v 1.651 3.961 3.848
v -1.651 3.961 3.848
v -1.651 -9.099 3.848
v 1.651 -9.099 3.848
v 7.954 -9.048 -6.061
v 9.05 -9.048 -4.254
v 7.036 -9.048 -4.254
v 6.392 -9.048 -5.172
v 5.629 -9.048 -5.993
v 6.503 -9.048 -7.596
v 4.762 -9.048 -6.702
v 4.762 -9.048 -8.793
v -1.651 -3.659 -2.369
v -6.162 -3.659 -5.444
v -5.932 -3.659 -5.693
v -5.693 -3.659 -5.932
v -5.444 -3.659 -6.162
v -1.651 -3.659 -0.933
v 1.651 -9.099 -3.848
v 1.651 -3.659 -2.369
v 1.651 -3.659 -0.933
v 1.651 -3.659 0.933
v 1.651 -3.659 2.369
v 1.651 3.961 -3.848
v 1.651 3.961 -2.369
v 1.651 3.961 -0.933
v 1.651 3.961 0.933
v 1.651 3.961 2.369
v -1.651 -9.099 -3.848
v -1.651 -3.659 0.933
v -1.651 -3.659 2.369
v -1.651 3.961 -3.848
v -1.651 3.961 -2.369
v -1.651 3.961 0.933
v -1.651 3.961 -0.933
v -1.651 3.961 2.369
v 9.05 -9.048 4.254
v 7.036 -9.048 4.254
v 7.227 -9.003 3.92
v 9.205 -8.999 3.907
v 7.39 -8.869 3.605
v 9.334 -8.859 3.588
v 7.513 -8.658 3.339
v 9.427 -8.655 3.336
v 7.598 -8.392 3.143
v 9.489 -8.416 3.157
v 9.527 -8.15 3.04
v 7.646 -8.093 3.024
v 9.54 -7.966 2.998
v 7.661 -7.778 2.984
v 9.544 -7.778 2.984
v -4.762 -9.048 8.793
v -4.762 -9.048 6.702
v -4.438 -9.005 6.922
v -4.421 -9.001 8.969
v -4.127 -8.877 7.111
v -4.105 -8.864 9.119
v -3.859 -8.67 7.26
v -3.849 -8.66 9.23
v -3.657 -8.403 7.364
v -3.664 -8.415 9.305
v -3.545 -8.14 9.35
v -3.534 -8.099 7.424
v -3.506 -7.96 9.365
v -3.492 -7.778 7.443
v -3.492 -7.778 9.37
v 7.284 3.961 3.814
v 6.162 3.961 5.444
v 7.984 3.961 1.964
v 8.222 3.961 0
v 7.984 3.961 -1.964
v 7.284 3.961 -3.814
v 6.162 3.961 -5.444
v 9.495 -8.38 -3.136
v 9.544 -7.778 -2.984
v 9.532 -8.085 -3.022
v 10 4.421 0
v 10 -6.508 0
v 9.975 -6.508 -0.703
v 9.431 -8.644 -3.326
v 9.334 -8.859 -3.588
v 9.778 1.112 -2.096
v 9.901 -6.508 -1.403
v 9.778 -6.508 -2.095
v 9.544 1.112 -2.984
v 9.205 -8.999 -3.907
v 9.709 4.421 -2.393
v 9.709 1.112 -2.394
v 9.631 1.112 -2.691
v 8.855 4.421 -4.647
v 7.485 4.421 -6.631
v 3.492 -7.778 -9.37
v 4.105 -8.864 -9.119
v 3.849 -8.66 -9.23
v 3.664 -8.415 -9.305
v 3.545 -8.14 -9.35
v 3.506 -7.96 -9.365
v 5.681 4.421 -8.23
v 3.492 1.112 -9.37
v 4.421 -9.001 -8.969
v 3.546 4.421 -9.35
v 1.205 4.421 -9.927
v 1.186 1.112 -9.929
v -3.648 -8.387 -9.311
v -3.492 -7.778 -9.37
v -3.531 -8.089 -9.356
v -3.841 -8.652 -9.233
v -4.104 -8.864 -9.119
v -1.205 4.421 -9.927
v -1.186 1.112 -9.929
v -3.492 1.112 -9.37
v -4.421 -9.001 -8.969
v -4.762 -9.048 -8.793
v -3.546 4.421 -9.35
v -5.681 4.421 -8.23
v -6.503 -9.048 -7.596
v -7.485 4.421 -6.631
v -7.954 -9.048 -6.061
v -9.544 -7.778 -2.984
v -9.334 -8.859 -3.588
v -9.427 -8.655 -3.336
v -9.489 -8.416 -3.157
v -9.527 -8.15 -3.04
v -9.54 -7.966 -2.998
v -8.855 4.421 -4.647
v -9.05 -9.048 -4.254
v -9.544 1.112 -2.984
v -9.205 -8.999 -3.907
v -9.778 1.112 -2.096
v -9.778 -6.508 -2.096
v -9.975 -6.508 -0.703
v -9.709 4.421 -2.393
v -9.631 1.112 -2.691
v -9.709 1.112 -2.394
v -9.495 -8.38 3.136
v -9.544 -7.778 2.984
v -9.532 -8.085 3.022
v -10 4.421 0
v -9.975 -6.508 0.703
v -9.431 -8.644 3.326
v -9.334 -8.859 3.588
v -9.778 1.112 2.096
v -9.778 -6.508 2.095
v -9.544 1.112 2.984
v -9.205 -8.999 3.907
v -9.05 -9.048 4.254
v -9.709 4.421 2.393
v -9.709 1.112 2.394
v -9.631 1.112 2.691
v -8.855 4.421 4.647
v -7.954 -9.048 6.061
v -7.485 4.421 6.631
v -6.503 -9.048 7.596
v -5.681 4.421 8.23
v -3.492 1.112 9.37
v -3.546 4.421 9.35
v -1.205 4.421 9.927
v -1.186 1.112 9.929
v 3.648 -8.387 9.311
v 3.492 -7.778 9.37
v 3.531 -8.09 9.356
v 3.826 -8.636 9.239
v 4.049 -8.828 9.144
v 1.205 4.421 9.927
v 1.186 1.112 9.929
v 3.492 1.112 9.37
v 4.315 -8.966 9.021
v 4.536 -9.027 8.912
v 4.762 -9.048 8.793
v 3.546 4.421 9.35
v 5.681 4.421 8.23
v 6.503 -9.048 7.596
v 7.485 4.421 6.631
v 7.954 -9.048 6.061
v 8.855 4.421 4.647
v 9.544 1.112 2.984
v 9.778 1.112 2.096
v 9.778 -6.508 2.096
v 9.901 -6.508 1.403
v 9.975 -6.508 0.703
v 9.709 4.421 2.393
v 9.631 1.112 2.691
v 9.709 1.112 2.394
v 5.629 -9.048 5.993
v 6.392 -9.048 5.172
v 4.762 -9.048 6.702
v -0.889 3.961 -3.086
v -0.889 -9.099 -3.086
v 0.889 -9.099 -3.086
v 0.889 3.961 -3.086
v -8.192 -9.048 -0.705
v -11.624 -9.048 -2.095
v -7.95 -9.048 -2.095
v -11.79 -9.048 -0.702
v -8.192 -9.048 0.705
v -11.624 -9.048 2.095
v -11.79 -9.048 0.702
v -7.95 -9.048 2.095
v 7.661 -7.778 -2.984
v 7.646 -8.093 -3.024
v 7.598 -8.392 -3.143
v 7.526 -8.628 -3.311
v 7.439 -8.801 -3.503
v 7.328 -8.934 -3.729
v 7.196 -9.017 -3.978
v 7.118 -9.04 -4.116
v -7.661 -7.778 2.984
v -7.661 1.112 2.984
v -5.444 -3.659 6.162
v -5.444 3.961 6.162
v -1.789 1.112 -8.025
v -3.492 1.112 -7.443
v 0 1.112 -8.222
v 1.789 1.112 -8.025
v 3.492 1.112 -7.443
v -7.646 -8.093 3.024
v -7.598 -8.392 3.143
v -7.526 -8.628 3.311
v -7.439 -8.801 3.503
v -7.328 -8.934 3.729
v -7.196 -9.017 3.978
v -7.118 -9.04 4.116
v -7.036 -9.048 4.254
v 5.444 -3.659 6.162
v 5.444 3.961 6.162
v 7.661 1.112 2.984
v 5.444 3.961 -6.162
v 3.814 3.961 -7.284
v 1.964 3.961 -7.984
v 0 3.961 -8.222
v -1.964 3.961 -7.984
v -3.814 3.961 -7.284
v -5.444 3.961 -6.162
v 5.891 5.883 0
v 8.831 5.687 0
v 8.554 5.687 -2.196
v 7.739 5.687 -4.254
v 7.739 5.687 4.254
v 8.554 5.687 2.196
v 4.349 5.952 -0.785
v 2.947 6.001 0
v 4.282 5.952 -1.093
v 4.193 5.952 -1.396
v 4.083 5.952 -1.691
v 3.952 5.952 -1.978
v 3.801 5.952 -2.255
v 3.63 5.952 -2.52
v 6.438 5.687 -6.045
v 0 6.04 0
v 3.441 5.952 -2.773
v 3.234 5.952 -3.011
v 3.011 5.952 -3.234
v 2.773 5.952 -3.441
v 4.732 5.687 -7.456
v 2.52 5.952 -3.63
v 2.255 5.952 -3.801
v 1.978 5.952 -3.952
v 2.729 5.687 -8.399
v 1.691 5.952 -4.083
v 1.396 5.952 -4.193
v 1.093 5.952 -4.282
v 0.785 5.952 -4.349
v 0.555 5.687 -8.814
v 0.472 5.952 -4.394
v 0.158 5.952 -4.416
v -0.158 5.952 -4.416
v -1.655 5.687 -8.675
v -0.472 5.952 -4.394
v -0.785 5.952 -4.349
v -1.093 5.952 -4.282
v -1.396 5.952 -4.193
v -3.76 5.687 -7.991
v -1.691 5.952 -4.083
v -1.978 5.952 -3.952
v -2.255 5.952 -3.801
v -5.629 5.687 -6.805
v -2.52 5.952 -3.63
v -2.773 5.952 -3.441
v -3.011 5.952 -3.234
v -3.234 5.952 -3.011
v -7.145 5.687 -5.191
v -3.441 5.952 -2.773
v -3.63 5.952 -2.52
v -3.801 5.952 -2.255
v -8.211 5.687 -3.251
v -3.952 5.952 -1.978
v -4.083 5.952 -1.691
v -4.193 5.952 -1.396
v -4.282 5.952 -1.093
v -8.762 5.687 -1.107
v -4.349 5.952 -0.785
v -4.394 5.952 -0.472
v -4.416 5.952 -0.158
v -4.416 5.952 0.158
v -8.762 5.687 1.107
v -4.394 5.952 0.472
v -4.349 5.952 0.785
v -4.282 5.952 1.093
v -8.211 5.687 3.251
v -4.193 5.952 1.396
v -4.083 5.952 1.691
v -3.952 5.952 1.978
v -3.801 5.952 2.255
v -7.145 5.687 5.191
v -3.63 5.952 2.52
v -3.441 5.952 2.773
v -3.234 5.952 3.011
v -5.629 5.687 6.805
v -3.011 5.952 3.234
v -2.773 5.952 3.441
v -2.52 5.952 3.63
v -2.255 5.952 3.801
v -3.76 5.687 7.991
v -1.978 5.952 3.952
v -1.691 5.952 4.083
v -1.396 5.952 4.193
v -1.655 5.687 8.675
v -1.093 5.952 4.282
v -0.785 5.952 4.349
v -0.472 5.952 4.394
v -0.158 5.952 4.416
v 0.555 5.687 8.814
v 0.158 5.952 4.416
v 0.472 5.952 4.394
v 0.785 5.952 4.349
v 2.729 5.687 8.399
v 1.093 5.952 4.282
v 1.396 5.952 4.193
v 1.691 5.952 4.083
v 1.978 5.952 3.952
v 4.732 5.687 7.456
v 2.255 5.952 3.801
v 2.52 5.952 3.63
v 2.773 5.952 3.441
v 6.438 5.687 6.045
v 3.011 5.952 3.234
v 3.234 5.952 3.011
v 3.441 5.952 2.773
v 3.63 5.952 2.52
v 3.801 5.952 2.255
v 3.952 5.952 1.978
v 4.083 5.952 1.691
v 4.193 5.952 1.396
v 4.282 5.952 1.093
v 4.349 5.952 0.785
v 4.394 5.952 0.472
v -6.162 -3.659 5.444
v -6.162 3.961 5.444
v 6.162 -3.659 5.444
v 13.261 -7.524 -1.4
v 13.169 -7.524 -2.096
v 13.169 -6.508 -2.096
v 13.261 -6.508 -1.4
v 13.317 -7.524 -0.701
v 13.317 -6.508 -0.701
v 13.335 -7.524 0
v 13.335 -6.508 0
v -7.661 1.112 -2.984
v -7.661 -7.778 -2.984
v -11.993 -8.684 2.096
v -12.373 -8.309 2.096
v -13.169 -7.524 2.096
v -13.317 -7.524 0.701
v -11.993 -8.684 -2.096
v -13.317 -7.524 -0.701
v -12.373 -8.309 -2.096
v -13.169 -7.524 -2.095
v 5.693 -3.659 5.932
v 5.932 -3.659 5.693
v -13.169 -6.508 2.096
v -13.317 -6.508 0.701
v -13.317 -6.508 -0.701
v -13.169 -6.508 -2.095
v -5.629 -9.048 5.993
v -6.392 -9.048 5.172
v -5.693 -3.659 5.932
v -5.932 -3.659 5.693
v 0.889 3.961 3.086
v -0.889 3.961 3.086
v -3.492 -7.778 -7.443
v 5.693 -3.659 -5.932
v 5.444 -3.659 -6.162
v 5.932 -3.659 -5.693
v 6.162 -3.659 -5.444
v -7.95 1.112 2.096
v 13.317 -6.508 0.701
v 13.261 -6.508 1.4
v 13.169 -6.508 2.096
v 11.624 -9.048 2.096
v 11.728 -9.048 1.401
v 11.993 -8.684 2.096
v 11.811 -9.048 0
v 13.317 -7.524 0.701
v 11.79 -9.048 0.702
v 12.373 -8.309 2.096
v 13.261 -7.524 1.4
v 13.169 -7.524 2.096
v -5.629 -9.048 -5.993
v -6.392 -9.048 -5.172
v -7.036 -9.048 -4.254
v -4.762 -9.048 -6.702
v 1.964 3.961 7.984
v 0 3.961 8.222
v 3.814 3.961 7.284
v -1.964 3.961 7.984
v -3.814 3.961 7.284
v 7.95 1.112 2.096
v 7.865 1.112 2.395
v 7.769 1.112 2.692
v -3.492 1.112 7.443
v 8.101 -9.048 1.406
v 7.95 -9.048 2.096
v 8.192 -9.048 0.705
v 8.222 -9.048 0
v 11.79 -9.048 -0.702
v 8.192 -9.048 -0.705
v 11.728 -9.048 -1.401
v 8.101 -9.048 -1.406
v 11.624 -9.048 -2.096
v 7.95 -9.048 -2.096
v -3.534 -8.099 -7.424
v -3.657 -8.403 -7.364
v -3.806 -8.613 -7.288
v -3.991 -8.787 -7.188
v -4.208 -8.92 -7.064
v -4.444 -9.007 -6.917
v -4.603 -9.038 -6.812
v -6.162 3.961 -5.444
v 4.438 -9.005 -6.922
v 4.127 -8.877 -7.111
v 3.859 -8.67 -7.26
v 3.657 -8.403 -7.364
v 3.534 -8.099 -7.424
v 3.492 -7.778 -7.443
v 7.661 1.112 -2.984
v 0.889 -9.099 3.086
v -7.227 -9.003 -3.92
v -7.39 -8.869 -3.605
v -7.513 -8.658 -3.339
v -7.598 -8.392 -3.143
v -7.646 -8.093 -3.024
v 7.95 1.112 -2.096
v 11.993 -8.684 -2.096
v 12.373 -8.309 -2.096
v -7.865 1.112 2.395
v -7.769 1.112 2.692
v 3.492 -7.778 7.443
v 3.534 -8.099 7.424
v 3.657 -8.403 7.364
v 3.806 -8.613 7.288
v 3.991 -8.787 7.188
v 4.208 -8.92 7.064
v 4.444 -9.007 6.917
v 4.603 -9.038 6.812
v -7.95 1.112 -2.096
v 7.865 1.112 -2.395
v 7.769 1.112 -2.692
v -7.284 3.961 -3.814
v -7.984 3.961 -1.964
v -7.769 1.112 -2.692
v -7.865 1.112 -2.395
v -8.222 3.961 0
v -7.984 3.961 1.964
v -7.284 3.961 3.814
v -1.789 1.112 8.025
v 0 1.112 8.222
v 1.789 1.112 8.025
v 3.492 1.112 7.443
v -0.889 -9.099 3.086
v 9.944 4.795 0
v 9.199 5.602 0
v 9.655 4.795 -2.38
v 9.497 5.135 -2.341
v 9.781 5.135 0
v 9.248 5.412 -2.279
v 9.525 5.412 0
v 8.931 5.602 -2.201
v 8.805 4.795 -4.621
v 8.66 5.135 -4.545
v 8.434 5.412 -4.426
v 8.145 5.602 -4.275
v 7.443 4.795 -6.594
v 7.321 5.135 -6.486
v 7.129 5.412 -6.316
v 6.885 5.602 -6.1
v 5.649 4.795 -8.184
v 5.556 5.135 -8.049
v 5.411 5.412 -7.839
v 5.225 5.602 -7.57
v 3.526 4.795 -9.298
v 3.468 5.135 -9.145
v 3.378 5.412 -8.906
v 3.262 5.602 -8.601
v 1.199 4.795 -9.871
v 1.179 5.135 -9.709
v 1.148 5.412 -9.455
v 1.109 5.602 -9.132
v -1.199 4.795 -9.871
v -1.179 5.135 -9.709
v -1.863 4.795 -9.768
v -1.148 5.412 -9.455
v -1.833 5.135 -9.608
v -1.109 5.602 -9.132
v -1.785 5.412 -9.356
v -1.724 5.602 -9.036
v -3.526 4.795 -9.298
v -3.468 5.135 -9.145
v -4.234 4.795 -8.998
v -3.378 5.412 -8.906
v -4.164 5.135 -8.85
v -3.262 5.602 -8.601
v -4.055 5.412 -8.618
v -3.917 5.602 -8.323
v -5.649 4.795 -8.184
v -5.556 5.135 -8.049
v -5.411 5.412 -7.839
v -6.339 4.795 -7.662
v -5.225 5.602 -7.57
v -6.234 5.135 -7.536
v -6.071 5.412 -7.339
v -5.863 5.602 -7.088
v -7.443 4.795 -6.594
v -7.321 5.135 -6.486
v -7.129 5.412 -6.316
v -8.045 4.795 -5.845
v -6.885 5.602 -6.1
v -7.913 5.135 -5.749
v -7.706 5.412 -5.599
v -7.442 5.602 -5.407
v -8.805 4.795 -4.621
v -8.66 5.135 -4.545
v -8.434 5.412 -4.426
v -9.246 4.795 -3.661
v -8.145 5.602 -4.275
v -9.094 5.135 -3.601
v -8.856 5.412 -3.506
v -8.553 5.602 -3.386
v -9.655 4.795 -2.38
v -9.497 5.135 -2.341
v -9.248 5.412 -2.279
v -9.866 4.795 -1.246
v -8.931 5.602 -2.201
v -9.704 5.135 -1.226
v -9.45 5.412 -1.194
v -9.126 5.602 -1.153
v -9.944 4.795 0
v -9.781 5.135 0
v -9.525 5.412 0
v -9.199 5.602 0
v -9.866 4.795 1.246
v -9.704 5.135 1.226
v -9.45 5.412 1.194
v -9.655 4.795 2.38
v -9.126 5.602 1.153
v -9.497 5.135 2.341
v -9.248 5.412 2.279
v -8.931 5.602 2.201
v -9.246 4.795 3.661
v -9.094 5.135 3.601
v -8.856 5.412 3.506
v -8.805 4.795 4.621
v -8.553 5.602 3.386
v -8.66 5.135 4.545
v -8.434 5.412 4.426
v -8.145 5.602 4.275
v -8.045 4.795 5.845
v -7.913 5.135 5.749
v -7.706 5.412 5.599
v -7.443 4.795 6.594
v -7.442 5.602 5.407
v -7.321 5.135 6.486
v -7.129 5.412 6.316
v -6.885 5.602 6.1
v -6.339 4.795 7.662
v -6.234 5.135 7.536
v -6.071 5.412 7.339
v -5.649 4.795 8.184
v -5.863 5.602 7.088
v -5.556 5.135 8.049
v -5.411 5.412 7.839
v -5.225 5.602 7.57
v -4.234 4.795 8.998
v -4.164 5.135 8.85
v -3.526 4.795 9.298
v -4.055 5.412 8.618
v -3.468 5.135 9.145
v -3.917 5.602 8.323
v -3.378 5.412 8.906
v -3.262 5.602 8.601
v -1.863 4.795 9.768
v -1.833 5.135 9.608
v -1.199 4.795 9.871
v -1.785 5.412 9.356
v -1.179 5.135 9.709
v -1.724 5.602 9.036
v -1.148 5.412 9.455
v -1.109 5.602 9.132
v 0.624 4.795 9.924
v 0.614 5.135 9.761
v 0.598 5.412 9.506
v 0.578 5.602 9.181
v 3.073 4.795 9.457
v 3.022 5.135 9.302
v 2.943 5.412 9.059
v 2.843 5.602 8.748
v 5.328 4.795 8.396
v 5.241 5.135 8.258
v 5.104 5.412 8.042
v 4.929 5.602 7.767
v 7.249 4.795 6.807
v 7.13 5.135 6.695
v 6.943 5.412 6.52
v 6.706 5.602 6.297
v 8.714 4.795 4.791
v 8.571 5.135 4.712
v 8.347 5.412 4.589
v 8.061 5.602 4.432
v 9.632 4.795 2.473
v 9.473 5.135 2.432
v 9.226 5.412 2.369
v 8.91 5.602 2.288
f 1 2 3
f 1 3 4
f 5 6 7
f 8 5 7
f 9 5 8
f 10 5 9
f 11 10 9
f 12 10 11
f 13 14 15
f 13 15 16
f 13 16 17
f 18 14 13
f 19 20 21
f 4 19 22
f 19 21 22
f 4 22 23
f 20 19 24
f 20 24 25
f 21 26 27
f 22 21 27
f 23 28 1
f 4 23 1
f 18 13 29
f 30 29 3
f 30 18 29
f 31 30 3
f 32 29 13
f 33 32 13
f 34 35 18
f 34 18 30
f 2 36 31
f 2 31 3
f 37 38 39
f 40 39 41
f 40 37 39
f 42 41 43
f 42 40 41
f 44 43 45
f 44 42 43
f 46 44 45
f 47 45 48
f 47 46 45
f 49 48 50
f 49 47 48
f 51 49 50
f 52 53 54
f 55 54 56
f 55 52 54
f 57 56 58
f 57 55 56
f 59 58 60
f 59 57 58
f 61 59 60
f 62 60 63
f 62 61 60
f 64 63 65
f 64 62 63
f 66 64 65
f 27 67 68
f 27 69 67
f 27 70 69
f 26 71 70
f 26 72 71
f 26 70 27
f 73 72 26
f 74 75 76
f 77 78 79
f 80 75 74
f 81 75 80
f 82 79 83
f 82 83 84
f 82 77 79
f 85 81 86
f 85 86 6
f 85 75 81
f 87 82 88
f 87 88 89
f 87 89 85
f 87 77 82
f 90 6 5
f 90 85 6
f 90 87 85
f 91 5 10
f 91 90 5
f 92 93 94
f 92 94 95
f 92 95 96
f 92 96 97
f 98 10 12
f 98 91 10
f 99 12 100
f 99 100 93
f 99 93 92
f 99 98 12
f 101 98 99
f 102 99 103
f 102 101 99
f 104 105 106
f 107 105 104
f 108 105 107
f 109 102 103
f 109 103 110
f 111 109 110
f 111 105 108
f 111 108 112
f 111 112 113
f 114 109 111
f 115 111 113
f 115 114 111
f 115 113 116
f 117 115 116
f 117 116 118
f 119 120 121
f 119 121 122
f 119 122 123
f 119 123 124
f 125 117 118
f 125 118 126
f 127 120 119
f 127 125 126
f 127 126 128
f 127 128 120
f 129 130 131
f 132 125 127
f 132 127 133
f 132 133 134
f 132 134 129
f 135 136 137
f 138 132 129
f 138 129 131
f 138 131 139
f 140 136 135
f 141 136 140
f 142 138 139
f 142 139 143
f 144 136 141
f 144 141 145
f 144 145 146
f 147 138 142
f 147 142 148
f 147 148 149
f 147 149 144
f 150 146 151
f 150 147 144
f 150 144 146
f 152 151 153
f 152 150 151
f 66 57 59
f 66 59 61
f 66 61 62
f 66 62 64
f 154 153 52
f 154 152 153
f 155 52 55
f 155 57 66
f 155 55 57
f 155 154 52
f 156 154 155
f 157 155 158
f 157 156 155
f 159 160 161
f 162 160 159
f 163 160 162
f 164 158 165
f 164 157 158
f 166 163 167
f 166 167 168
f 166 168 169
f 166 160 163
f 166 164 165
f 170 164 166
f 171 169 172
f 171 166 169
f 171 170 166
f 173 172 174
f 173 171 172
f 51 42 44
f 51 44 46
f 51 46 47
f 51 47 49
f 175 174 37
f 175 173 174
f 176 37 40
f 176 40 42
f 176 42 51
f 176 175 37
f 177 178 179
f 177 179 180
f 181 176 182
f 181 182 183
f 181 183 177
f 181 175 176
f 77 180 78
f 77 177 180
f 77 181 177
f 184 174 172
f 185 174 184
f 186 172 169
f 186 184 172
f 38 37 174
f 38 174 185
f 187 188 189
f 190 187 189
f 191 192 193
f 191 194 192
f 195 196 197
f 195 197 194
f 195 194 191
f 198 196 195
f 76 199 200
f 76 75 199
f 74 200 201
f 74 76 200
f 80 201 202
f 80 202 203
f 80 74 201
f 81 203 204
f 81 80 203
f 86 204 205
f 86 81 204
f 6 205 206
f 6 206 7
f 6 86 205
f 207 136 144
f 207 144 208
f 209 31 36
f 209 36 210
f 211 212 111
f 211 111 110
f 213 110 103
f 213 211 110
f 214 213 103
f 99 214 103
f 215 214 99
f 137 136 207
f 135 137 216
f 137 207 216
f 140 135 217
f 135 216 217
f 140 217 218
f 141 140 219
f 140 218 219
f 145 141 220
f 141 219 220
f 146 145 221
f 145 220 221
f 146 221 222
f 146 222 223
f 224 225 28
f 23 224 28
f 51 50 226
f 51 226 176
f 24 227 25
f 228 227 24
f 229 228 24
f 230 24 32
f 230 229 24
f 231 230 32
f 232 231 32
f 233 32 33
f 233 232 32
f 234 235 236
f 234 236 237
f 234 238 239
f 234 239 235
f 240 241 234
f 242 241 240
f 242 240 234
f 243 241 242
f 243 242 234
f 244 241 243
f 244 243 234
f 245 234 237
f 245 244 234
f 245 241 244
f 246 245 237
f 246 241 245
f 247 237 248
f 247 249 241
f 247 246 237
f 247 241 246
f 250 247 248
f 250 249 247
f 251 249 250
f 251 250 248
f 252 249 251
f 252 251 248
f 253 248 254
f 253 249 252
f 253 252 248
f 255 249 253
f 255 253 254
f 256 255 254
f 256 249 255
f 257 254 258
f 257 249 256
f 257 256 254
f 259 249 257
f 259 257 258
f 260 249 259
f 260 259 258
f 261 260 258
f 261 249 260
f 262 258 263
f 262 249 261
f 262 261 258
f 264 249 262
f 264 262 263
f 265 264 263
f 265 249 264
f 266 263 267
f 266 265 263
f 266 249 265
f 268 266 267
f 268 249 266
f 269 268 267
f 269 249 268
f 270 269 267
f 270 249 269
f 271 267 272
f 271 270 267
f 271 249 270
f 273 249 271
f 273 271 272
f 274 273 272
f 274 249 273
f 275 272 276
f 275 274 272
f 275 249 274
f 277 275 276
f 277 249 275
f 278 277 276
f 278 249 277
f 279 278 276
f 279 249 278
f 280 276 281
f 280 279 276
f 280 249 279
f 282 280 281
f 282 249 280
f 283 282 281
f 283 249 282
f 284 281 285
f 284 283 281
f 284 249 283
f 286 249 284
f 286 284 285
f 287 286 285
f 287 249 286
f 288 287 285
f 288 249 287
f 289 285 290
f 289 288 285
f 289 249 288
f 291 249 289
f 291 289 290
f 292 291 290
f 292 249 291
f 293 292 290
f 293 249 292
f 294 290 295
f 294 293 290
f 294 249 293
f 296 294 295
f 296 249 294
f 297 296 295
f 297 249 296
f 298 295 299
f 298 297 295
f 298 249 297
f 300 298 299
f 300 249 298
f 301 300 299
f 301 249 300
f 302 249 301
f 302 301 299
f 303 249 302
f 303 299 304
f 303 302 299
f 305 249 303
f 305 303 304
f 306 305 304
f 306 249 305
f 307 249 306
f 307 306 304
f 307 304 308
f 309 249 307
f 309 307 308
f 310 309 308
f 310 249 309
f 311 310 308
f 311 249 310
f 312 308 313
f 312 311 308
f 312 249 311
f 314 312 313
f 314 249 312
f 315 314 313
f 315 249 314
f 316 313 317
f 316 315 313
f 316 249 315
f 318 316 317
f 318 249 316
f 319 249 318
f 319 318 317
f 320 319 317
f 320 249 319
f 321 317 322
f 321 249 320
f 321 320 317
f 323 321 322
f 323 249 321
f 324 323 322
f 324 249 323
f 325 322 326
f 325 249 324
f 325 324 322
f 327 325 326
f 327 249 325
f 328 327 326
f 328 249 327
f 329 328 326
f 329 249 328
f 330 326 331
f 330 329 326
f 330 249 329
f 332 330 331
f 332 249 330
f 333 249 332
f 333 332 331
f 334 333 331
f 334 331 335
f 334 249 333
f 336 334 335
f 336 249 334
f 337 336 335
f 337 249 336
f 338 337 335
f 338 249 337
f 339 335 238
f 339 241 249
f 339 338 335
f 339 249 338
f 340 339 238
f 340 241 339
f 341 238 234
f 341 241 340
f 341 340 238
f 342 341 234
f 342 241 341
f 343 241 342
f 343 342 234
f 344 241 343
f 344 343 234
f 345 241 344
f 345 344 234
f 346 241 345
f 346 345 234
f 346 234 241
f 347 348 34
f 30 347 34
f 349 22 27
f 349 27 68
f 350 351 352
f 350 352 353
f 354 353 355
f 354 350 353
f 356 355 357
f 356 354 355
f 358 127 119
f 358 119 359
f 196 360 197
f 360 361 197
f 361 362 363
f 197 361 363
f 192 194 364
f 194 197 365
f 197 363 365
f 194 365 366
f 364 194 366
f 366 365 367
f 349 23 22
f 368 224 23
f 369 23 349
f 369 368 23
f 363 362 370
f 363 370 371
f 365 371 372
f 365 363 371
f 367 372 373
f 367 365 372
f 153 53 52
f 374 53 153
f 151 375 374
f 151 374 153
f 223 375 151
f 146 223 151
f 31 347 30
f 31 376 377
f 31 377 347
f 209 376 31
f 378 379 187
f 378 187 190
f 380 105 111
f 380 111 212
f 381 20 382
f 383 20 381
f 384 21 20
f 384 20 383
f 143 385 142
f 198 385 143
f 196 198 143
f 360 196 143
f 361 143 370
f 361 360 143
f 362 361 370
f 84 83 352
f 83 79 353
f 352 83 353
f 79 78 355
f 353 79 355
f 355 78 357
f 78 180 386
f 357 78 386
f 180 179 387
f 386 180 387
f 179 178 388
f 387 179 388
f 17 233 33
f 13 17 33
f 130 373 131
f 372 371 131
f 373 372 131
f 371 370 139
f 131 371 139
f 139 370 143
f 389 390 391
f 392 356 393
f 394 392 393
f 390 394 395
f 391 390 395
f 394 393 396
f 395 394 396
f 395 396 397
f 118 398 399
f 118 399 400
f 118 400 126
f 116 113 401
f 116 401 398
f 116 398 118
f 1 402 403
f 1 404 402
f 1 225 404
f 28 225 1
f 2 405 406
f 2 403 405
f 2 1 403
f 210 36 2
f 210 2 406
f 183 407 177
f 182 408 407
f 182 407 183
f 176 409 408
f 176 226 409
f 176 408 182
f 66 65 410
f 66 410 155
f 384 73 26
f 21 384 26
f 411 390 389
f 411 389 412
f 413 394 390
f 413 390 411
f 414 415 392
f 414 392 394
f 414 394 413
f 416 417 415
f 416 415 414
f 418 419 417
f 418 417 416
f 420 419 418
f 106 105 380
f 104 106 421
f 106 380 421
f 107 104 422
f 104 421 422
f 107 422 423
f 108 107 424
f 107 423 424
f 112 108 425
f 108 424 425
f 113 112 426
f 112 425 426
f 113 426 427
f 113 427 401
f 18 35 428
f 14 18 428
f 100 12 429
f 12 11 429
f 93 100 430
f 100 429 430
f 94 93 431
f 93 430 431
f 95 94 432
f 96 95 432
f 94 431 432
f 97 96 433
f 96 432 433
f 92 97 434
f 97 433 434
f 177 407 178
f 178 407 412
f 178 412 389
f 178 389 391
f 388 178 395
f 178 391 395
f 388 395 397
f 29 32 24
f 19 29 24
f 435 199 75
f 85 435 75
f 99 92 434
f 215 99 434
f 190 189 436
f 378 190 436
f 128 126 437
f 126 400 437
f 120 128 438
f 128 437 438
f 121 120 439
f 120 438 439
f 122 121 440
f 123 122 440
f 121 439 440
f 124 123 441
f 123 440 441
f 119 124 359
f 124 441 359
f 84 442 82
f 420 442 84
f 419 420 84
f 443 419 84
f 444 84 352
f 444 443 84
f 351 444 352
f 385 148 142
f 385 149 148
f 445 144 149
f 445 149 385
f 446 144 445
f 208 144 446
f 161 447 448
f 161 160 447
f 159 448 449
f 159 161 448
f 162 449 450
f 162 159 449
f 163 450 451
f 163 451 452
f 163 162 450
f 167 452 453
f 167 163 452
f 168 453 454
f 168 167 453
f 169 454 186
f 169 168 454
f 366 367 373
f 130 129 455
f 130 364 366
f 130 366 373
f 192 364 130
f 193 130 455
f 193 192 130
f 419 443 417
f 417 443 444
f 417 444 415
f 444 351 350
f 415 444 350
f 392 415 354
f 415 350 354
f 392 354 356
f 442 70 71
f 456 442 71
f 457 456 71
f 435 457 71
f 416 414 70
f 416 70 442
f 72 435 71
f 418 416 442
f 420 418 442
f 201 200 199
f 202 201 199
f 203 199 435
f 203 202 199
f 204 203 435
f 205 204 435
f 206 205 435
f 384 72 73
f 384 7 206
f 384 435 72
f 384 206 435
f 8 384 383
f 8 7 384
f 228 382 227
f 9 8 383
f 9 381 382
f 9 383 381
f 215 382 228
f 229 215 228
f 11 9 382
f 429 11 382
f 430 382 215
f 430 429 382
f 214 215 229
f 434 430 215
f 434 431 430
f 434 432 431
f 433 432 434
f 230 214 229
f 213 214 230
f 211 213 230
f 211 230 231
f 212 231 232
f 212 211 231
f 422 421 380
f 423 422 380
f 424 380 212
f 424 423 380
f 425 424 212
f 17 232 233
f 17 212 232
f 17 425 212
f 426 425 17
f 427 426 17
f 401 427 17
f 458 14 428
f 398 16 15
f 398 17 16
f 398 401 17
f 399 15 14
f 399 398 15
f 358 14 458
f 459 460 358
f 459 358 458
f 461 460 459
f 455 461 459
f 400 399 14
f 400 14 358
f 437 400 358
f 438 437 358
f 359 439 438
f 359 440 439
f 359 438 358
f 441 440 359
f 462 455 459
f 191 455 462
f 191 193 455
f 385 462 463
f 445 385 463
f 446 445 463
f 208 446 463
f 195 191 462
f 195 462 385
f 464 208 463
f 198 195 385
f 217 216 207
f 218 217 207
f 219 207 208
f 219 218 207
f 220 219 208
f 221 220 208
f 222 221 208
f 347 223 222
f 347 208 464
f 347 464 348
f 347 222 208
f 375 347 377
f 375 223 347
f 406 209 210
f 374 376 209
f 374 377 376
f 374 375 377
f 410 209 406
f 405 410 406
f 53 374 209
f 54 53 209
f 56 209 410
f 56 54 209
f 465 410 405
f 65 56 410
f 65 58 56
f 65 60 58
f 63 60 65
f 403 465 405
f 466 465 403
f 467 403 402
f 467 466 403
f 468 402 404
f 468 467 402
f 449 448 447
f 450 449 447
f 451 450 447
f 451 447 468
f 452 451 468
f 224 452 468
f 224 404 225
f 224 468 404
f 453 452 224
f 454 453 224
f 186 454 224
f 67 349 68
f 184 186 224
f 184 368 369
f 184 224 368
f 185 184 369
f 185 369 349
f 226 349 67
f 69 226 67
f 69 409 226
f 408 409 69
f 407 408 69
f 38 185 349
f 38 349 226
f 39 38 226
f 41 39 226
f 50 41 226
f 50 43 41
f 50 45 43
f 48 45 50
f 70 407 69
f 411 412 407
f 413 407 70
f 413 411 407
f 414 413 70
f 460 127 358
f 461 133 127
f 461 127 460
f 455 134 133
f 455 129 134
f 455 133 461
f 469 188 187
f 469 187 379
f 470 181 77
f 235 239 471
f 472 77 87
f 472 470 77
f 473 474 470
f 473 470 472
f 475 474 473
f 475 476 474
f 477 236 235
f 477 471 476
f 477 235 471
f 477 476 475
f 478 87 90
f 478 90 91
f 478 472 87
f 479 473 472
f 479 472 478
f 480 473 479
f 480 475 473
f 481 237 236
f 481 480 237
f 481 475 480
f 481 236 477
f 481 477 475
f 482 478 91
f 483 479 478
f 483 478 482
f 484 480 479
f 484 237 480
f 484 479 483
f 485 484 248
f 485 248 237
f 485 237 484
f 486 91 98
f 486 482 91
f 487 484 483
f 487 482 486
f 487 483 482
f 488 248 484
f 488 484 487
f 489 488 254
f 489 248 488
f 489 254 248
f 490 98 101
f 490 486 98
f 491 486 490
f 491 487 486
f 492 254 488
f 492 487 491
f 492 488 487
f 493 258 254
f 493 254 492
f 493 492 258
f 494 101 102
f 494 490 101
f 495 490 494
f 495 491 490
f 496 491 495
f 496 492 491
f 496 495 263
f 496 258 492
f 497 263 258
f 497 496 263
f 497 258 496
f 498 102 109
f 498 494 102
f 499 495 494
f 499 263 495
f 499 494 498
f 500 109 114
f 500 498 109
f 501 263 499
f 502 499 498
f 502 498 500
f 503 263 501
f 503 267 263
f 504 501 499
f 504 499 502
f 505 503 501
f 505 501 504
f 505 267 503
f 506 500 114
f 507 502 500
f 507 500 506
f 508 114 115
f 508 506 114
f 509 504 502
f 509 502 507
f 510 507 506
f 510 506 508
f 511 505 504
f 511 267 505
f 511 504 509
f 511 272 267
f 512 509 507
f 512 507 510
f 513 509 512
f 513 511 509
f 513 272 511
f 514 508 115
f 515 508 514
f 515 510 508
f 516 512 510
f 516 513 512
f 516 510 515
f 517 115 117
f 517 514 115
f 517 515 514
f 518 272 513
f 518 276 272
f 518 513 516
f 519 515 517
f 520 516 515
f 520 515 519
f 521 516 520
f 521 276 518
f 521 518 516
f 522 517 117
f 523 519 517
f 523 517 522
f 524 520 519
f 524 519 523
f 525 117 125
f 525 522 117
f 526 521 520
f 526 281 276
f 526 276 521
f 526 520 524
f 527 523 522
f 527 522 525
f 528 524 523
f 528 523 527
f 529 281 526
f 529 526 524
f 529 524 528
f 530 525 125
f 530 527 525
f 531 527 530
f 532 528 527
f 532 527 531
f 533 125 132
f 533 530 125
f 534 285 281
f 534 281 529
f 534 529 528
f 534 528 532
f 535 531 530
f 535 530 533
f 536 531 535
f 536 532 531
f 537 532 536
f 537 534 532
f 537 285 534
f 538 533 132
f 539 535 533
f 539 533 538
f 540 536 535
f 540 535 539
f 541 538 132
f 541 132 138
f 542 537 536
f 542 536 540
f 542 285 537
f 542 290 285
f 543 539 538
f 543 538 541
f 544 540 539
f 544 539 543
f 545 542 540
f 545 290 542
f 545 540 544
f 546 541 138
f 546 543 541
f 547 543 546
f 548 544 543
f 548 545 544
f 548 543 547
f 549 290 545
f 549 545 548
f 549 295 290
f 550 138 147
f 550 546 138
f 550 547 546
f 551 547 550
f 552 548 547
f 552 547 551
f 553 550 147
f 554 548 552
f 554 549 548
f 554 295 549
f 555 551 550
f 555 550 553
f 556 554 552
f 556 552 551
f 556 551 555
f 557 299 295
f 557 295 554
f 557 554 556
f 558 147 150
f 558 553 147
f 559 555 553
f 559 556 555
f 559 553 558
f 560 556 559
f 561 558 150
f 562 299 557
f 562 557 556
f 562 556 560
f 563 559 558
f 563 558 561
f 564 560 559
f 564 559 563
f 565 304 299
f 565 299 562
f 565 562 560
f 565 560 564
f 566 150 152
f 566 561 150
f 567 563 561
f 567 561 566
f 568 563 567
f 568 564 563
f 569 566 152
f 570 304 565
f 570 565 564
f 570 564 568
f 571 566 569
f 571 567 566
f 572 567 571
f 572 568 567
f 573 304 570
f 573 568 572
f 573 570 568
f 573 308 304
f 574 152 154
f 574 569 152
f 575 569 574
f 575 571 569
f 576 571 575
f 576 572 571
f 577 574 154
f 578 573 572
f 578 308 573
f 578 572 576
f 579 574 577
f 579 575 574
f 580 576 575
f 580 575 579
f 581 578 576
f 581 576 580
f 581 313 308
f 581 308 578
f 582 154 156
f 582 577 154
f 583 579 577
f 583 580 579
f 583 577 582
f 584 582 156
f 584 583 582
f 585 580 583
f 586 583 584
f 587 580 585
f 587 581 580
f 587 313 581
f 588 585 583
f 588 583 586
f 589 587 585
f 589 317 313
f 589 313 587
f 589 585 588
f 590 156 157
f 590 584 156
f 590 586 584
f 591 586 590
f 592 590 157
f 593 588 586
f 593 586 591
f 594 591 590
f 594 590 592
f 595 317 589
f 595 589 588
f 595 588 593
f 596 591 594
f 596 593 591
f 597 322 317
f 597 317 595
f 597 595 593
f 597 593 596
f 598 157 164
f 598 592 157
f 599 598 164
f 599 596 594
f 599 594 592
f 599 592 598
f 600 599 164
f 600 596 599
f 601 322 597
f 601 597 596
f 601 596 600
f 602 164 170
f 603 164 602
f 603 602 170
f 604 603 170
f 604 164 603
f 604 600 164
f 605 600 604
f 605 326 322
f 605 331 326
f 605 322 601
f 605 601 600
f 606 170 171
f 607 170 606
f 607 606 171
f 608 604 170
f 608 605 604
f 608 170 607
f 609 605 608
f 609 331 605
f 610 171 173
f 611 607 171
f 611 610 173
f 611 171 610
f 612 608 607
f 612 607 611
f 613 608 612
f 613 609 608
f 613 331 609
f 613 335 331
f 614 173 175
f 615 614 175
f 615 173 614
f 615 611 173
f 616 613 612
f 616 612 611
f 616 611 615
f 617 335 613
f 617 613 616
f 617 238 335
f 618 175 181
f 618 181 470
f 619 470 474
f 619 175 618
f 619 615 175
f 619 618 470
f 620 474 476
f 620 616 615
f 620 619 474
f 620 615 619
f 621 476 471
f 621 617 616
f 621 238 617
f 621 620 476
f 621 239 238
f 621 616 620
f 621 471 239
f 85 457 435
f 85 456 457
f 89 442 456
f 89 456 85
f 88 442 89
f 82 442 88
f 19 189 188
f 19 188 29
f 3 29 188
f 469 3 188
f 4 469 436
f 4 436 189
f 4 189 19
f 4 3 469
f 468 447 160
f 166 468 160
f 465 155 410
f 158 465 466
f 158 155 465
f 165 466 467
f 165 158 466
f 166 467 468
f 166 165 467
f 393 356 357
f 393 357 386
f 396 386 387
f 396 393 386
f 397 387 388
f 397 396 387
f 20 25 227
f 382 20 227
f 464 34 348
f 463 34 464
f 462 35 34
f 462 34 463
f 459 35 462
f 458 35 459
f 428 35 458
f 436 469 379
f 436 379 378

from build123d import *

# Parameters (mm, degrees)
SKETCH2_W     = 6.985
SKETCH2_H     = 32.356336156
SKETCH2_W_2   = 40.972237954
SKETCH2_H_2   = 0.889
CUTOUT_DEPTH  = 10.16
TAB_DEPTH     = 2.54
TAB_CHMF_SIZE = 1.524
CROSS_DEPTH   = 7.62
SKETCH4_W     = 3.302
SKETCH4_H     = 7.6962
BOX_DEPTH     = 13.059399
SKETCH6_W     = 1.778
SKETCH6_H     = 6.1722
BOXCUT_DEPTH  = 13.059399
FILLET1_R     = 1.27


with BuildPart() as part:
    # Sketch1 → dome/base (revolve)
    with BuildSketch(Plane.XY):
        with BuildLine():
            Line((0, 6.039891065), (0, 3.960890157))
            Line((0, 3.960890157), (8.222, 3.960890157))
            Line((8.222, 3.960890157), (8.222, -9.047708935))
            Line((8.222, -9.047708935), (10, -9.047708935))
            Line((10, -9.047708935), (10, 4.421422334))
            ThreePointArc((10, 4.421422334), (9.66312833, 5.282916106), (8.831225953, 5.687381775))
            ThreePointArc((8.831225953, 5.687381775), (4.419129287, 5.951728667), (0, 6.039891065))
        make_face()
    revolve(axis=Axis((0, 0, 0), (0, 1, 0)))

    # Sketch2 → cutout (cut)
    with BuildSketch(Plane.XZ.offset(9.047708935)):
        Rectangle(SKETCH2_W, SKETCH2_H)
        with Locations((0, 2.54)):
            Rectangle(SKETCH2_W_2, SKETCH2_H_2)
        with Locations((0, -2.54)):
            Rectangle(SKETCH2_W_2, SKETCH2_H_2)
    extrude(amount=-CUTOUT_DEPTH, mode=Mode.SUBTRACT)

    # Sketch3 → tab (add)
    with BuildSketch(Plane.XZ.offset(9.047708935)):
        with BuildLine():
            Line((-13.169324385, -2.0955), (-9.777979329, -2.0955))
            ThreePointArc((-9.777979329, -2.0955), (-10, 0), (-9.777979329, 2.0955))
            Line((-9.777979329, 2.0955), (-13.169324385, 2.0955))
            ThreePointArc((-13.169324385, 2.0955), (-13.335, 0), (-13.169324385, -2.0955))
        make_face()
        with BuildLine():
            Line((9.777979329, -2.0955), (13.169324385, -2.0955))
            ThreePointArc((13.169324385, -2.0955), (13.293516571, -1.051019583), (13.335, 0))
            ThreePointArc((13.335, 0), (13.293516571, 1.051019583), (13.169324385, 2.0955))
            Line((13.169324385, 2.0955), (9.777979329, 2.0955))
            ThreePointArc((9.777979329, 2.0955), (10, 0), (9.777979329, -2.0955))
        make_face()
    extrude(amount=-TAB_DEPTH)

    # tab chmf
    tab_chmf_edges = [part.edges().sort_by_distance(p)[0] for p in [
        (-13.335, -9.047708935, 0),
        (13.335, -9.047708935, 0),
    ]]
    chamfer(tab_chmf_edges, length=TAB_CHMF_SIZE)

    # Sketch5 → cross (add)
    with BuildSketch(Plane.XZ.offset(-3.960890157)):
        with BuildLine():
            Line((0, -0.71842049), (-0.71842049, 0))
            Line((-0.71842049, 0), (-6.161934605, -5.443514115))
            ThreePointArc((-6.161934605, -5.443514115), (-5.813831955, -5.813831955), (-5.443514115, -6.161934605))
            Line((-5.443514115, -6.161934605), (0, -0.71842049))
        make_face()
        with BuildLine():
            Line((6.161934605, -5.443514115), (0.71842049, 0))
            Line((0.71842049, 0), (0, -0.71842049))
            Line((0, -0.71842049), (5.443514115, -6.161934605))
            ThreePointArc((5.443514115, -6.161934605), (5.813831955, -5.813831955), (6.161934605, -5.443514115))
        make_face()
        with BuildLine():
            Line((5.443514115, 6.161934605), (0, 0.71842049))
            Line((0, 0.71842049), (0.71842049, 0))
            Line((0.71842049, 0), (6.161934605, 5.443514115))
            ThreePointArc((6.161934605, 5.443514115), (5.813831955, 5.813831955), (5.443514115, 6.161934605))
        make_face()
        Polygon((0.71842049, 0), (0, 0.71842049), (-0.71842049, 0), (0, -0.71842049), align=None)
        with BuildLine():
            Line((-0.71842049, 0), (0, 0.71842049))
            Line((0, 0.71842049), (-5.443514115, 6.161934605))
            ThreePointArc((-5.443514115, 6.161934605), (-5.813831955, 5.813831955), (-6.161934605, 5.443514115))
            Line((-6.161934605, 5.443514115), (-0.71842049, 0))
        make_face()
    extrude(amount=CROSS_DEPTH)

    # Sketch4 → box (add)
    with BuildSketch(Plane.XZ.offset(-3.960890157)):
        Rectangle(SKETCH4_W, SKETCH4_H)
    extrude(amount=BOX_DEPTH)

    # Sketch6 → boxcut (cut)
    with BuildSketch(Plane.XZ.offset(9.098508935)):
        Rectangle(SKETCH6_W, SKETCH6_H)
    extrude(amount=-BOXCUT_DEPTH, mode=Mode.SUBTRACT)

    # Fillet1
    fillet1_edges = [part.edges().sort_by_distance(p)[0] for p in [
        (-3.4925, -9.047708935, -8.406831929),
        (3.4925, -9.047708935, -8.406831929),
        (8.602728257, -9.047708935, -2.9845),
        (-8.602728257, -9.047708935, -2.9845),
        (-3.4925, -9.047708935, 8.406831929),
        (3.4925, -9.047708935, 8.406831929),
        (-8.602728257, -9.047708935, 2.9845),
        (8.602728257, -9.047708935, 2.9845),
    ]]
    fillet(fillet1_edges, radius=FILLET1_R)


solid = part.part
